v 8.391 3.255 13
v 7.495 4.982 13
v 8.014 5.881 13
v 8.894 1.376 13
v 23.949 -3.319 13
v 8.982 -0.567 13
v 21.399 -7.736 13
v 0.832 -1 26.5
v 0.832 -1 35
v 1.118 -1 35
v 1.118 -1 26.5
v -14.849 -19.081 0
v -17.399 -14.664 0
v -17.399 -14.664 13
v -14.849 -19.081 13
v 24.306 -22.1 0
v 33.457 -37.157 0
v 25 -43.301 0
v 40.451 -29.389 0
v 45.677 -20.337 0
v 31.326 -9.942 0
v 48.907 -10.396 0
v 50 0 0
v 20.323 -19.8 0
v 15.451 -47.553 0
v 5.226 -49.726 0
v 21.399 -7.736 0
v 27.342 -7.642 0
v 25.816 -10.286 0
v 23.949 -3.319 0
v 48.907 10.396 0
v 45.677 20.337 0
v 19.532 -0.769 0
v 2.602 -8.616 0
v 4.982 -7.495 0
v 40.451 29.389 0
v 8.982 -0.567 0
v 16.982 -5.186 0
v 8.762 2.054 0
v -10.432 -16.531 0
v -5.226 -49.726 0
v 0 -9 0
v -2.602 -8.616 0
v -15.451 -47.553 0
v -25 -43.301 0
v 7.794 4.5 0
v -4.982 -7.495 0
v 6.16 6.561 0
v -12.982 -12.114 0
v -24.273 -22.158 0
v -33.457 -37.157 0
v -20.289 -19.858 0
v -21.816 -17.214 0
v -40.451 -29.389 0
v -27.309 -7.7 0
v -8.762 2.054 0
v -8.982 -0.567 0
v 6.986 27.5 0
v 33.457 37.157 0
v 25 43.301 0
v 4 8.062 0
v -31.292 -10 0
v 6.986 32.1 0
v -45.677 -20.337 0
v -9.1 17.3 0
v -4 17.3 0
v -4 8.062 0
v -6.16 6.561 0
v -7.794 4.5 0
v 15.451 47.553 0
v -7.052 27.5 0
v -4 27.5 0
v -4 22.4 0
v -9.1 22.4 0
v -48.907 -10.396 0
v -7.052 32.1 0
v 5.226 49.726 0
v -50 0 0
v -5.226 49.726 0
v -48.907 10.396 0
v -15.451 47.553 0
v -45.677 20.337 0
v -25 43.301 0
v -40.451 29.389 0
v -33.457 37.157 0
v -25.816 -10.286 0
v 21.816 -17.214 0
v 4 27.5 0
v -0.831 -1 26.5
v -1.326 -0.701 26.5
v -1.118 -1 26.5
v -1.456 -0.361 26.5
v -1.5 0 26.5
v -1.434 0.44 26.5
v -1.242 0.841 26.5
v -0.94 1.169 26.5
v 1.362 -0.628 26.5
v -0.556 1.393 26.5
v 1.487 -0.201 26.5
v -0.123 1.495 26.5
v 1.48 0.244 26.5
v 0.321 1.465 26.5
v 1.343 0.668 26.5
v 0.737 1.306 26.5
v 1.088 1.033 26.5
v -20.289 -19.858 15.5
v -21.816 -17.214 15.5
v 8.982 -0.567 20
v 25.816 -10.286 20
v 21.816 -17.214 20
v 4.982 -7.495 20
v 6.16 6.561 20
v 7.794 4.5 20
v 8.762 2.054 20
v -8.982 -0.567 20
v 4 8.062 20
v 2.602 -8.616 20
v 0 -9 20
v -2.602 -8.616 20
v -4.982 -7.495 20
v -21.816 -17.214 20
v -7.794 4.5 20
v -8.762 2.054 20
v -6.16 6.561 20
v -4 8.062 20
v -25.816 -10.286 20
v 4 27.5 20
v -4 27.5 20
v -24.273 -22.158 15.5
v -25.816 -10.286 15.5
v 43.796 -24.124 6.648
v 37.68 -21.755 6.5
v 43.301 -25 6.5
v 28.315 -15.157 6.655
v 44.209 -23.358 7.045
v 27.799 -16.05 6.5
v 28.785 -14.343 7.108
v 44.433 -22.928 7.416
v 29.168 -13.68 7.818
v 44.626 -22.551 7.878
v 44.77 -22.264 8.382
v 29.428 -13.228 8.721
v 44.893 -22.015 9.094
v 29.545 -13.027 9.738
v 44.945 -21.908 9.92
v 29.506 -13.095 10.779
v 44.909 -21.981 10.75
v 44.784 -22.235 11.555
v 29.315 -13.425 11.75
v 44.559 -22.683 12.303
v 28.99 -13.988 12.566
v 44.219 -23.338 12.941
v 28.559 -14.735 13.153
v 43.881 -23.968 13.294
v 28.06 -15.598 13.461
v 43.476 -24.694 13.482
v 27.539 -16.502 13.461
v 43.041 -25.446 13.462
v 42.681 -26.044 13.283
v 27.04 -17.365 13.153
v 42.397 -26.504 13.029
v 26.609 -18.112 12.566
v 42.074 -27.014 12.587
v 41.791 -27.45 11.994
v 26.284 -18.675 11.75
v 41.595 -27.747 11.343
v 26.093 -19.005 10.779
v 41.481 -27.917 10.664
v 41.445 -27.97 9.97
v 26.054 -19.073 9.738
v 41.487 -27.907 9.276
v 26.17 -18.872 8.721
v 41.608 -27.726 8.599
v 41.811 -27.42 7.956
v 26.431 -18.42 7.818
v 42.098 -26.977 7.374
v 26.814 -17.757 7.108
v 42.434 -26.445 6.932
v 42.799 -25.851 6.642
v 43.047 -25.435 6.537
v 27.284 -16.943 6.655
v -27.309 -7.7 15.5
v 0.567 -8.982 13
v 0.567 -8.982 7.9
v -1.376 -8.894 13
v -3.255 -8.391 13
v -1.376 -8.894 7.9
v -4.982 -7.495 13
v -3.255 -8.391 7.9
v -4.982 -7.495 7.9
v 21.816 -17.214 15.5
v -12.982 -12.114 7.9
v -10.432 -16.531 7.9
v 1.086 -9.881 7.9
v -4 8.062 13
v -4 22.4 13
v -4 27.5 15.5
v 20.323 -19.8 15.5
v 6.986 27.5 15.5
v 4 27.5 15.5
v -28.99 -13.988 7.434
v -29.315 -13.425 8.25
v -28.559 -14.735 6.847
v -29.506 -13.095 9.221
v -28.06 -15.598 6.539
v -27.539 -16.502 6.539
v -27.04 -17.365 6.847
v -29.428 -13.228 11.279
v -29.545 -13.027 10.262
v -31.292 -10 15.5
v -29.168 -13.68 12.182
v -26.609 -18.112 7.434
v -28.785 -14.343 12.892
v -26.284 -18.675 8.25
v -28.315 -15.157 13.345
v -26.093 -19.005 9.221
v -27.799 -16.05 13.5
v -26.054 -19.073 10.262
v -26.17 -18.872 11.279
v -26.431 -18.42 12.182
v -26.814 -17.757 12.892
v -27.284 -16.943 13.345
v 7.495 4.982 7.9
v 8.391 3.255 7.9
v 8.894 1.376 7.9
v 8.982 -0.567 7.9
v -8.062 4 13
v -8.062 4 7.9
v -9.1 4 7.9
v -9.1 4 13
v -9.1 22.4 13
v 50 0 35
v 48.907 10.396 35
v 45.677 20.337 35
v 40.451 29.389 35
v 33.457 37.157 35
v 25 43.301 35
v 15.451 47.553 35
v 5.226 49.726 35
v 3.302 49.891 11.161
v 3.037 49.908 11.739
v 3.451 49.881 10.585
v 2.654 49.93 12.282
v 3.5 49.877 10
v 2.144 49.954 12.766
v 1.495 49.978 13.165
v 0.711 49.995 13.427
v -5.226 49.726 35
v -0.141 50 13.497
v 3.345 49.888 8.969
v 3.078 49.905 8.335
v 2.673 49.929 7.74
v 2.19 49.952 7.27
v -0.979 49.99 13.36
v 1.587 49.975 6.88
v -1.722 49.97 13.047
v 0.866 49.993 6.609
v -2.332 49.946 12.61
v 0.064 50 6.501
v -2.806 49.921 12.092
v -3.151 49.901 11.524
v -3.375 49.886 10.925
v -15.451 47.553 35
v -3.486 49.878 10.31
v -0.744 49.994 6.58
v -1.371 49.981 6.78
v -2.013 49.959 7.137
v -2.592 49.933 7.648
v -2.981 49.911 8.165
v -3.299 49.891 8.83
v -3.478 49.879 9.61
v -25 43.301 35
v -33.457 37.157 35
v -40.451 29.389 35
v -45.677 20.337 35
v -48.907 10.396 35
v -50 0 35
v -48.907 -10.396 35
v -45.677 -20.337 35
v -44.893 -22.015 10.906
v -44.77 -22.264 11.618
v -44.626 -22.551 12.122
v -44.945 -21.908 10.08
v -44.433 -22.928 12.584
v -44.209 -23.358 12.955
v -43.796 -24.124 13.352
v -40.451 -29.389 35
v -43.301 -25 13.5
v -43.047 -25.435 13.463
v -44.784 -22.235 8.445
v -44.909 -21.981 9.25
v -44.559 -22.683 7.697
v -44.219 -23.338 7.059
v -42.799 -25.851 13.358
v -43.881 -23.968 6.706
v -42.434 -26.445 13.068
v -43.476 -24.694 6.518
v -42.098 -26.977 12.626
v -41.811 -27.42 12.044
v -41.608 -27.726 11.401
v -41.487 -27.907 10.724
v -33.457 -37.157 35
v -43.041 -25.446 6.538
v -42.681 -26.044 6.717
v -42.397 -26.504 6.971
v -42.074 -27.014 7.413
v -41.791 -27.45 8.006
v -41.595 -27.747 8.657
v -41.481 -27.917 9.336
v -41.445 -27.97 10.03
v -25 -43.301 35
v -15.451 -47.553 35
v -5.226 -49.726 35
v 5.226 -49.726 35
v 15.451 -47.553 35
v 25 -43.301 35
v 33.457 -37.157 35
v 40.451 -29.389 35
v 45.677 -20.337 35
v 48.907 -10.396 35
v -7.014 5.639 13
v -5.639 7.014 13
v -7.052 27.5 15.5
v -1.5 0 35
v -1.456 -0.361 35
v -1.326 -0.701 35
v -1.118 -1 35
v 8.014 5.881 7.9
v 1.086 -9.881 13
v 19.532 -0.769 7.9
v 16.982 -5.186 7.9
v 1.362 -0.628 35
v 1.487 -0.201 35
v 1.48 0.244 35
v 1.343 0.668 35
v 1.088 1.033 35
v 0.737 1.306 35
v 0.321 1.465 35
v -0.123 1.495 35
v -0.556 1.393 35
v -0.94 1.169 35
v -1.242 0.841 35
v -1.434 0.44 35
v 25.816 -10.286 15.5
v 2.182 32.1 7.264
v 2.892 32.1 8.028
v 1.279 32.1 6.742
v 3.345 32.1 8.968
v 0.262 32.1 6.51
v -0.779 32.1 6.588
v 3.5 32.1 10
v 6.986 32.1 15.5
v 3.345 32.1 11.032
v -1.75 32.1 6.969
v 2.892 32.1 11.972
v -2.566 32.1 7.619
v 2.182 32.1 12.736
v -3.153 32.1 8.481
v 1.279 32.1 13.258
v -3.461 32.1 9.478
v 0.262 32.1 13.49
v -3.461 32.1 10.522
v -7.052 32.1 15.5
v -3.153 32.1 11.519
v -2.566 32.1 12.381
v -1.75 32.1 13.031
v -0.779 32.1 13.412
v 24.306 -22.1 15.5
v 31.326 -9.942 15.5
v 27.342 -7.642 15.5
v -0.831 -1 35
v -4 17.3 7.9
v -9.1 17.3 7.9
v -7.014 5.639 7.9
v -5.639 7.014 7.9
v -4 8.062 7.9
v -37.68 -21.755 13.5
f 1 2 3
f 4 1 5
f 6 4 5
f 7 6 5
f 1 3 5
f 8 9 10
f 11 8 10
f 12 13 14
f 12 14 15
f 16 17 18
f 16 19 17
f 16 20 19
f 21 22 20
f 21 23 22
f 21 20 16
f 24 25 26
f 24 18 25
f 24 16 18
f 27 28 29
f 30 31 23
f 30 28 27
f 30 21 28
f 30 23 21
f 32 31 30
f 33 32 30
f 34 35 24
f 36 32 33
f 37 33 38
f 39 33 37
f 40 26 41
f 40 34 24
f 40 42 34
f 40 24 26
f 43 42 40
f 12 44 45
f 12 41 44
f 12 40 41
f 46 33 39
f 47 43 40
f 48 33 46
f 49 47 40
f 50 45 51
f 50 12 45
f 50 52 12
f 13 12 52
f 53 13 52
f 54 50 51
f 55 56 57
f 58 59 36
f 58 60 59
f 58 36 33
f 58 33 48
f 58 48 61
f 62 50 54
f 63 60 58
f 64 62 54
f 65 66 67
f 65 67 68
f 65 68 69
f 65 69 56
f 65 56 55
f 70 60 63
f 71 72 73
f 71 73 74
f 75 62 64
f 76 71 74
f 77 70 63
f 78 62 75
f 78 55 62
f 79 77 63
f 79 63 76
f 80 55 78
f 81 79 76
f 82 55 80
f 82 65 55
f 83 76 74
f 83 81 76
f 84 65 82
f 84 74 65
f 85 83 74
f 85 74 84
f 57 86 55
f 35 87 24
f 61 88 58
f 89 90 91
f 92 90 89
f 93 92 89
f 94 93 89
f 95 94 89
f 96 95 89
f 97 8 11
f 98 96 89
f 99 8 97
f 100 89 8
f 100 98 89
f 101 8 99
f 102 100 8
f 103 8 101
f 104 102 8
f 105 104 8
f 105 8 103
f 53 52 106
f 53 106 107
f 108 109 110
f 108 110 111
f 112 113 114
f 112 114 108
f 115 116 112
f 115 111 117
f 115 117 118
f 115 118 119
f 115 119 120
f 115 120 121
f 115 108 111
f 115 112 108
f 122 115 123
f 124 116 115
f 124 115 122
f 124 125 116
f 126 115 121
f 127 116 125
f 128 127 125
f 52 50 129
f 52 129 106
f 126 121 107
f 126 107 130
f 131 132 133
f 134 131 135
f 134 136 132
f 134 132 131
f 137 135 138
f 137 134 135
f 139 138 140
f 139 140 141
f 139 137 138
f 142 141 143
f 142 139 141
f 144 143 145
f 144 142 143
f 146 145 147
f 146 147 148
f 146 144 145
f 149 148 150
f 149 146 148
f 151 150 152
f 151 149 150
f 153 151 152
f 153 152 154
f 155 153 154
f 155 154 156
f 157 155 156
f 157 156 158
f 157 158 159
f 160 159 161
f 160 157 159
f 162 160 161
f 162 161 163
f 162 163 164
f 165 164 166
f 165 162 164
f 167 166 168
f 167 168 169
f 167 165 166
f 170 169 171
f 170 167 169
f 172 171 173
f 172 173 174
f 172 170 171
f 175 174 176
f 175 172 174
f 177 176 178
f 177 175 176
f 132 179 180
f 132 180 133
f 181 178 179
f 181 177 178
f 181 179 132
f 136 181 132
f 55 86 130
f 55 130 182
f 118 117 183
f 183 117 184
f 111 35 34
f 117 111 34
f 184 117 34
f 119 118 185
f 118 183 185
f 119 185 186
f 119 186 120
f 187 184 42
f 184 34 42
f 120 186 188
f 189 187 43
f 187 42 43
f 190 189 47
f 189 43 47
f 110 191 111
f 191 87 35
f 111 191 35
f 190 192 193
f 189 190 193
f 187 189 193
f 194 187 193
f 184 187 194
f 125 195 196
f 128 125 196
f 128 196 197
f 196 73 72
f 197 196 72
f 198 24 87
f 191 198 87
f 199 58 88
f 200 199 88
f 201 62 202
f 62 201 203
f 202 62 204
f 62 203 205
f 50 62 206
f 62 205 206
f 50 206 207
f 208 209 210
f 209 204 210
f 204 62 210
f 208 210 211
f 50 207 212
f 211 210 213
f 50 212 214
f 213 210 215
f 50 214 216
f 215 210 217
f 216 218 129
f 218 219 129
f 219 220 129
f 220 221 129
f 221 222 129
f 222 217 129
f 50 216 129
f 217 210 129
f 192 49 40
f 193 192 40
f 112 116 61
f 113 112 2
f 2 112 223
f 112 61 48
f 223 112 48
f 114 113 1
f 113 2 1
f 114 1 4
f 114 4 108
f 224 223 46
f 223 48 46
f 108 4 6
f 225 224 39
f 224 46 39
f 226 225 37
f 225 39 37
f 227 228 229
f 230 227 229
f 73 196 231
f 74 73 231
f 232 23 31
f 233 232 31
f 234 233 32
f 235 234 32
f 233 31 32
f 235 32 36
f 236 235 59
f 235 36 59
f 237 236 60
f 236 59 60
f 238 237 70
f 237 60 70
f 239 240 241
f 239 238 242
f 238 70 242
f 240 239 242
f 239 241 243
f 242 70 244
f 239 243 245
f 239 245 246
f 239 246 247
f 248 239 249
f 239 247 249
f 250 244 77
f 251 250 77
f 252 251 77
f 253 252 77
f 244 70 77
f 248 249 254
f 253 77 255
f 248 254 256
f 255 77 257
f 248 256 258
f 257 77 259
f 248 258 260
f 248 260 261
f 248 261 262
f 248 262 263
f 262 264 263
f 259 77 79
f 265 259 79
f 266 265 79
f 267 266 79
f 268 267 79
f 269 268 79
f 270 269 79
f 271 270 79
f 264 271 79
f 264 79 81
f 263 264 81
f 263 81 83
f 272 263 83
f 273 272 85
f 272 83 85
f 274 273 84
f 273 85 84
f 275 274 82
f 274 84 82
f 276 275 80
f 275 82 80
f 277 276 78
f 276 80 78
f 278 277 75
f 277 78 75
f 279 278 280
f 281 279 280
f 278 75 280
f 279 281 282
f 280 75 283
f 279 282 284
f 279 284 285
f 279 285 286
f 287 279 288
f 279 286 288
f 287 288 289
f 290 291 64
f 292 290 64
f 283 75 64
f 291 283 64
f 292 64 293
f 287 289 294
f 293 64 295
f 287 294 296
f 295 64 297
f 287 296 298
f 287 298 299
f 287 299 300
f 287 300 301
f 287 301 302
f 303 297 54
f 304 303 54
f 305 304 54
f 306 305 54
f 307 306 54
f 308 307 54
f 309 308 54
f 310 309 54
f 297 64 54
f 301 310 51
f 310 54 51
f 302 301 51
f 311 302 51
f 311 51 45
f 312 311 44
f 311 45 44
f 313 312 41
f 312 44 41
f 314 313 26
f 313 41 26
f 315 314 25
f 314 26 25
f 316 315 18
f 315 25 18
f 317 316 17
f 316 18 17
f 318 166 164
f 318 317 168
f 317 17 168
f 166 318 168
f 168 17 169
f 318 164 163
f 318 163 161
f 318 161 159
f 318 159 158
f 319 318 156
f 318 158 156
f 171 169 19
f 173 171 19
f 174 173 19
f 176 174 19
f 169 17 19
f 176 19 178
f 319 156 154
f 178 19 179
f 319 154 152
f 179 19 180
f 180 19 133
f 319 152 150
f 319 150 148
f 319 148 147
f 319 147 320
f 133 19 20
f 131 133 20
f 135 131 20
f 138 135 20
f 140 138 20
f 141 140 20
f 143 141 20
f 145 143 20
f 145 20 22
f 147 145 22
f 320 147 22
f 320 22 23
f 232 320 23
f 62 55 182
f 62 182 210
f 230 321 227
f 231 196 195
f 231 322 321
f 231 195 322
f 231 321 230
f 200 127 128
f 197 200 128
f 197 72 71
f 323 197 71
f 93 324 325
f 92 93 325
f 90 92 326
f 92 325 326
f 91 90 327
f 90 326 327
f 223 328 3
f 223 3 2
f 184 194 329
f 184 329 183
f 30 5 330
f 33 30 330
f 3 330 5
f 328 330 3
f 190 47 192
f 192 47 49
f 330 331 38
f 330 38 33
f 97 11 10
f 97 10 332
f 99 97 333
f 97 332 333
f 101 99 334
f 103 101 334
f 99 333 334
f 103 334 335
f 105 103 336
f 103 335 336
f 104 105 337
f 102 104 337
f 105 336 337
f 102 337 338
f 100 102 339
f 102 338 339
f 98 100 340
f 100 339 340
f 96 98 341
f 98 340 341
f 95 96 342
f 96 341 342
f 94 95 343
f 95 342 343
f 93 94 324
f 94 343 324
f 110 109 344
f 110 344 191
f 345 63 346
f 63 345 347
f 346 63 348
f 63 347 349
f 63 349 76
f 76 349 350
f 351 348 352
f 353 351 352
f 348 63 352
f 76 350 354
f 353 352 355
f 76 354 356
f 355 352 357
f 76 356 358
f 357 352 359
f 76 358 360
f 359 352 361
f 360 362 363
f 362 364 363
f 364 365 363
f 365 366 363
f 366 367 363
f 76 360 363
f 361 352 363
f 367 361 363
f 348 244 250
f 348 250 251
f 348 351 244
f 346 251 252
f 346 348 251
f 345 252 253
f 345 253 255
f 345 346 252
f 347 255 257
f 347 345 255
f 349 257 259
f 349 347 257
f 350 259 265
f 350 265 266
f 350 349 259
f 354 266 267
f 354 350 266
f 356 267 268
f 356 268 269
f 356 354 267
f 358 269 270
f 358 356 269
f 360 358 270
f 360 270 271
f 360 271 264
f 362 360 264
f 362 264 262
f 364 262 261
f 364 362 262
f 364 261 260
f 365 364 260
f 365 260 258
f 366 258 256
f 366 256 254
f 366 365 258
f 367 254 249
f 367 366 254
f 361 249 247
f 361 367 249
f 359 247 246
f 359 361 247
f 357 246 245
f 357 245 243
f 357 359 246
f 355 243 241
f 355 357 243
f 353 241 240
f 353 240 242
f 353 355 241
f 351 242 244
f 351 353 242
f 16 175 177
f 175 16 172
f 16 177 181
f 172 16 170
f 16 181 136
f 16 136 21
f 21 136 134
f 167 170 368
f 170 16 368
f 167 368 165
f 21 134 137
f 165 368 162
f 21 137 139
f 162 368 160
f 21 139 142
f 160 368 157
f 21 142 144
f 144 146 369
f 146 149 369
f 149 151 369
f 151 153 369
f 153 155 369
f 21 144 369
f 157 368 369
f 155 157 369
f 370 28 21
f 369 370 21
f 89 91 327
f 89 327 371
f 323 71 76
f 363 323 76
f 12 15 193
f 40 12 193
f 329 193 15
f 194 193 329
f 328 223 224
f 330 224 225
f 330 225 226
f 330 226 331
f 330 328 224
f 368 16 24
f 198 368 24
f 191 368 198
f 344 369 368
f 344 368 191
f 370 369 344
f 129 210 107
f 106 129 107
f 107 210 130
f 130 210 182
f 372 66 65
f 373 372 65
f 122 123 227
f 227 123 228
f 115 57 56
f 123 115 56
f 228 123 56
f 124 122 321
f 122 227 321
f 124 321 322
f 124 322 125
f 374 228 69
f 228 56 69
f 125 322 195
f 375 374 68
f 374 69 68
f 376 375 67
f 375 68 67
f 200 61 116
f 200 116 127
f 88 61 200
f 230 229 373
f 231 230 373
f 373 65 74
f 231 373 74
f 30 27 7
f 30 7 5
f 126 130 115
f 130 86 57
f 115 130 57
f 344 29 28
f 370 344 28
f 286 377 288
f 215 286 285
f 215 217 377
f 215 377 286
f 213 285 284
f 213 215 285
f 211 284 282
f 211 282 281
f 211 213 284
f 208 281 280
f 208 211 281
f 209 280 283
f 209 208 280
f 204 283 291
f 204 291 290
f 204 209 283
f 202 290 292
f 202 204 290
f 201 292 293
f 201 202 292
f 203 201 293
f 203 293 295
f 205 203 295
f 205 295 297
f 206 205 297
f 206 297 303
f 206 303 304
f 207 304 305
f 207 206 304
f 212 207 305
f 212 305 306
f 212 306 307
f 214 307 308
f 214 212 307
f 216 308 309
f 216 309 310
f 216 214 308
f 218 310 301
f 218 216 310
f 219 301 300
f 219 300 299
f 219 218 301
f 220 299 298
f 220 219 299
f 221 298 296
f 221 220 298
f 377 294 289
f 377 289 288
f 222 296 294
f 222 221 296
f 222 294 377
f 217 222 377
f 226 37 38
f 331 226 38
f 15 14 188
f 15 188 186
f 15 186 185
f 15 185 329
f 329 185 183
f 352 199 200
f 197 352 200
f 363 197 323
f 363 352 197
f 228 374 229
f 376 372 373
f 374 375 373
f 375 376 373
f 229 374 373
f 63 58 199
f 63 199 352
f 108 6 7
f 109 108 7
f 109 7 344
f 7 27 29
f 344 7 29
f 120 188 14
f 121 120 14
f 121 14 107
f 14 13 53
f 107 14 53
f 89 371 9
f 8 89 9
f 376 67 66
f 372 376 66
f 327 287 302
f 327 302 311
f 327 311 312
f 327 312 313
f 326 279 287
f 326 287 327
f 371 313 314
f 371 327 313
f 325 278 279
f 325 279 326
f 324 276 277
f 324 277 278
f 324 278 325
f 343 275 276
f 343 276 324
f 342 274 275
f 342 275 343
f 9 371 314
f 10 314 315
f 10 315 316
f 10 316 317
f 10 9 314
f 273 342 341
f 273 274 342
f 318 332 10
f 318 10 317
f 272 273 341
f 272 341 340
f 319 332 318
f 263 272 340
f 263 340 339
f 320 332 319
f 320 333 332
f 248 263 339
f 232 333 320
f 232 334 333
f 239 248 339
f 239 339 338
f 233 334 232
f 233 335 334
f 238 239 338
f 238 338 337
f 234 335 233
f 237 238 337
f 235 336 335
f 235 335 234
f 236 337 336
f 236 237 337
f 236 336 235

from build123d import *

# Parameters (mm, degrees)
SKETCH2_R           = 50
BOSS_EXTRUDE1_DEPTH = 35
SKETCH3_W           = 8
SKETCH3_H           = 35
CUT_EXTRUDE1_DEPTH  = 20
SKETCH4_R           = 3.5
CUT_EXTRUDE2_DEPTH  = 80
SKETCH5_R           = 3.5
CUT_EXTRUDE3_DEPTH  = 50
SKETCH6_R           = 3.5
CUT_EXTRUDE4_DEPTH  = 50
SKETCH8_W           = 14.038446545
SKETCH8_H           = 6.5
CUT_EXTRUDE5_DEPTH  = 15.5
SKETCH11_W          = 8
SKETCH11_H          = 6.5
BOSS_EXTRUDE2_DEPTH = 4.5
BOSS_EXTRUDE3_DEPTH = 15.5
BOSS_EXTRUDE4_DEPTH = 35
SKETCH18_R          = 3.5
CUT_EXTRUDE9_DEPTH  = 25
SKETCH19_R          = 3.5
CUT_EXTRUDE10_DEPTH = 25
SKETCH20_R          = 3.5
CUT_EXTRUDE11_DEPTH = 25
SKETCH21_W          = 5.1
SKETCH21_H          = 18.4
CUT_EXTRUDE12_DEPTH = 13
SKETCH23_W          = 5.1
SKETCH23_H          = 18.4
CUT_EXTRUDE13_DEPTH = 13
SKETCH22_W          = 5.1
SKETCH22_H          = 13.3
BOSS_EXTRUDE5_DEPTH = 7.9
CUT_EXTRUDE14_DEPTH = 8.5
SKETCH25_R          = 9
CUT_EXTRUDE15_DEPTH = 20


with BuildPart() as part:
    # Sketch2 → Boss-Extrude1 (new body)
    with BuildSketch(Plane.XY):
        Circle(SKETCH2_R)
    extrude(amount=BOSS_EXTRUDE1_DEPTH)

    # Sketch3 → Cut-Extrude1 (cut)
    with BuildSketch(Plane(origin=(0, 0, 0), x_dir=(-1, 0, 0), z_dir=(0, 0, -1))):
        with Locations((0, 21.5)):
            Rectangle(SKETCH3_W, SKETCH3_H)
        Polygon((31.774990748, -22.964101615), (35.774990748, -16.035898385), (5.464101615, 1.464101615), (1.464101615, -5.464101615), align=None)
        Polygon((-35.774990748, -16.035898385), (-31.774990748, -22.964101615), (-1.464101615, -5.464101615), (-5.464101615, 1.464101615), align=None)
    extrude(amount=-CUT_EXTRUDE1_DEPTH, mode=Mode.SUBTRACT)

    # Sketch4 → Cut-Extrude2 (cut)
    with BuildSketch(Plane(origin=(-3.464101615, -2, 0), x_dir=(0, 0, 1), z_dir=(-0.866025404, -0.5, 0))):
        with Locations((10, 0)):
            Circle(SKETCH4_R)
    extrude(amount=CUT_EXTRUDE2_DEPTH, mode=Mode.SUBTRACT)

    # Sketch5 → Cut-Extrude3 (cut)
    with BuildSketch(Plane(origin=(0, 4, 0), x_dir=(1, 0, 0), z_dir=(0, 1, 0))):
        with Locations((0, -10)):
            Circle(SKETCH5_R)
    extrude(amount=CUT_EXTRUDE3_DEPTH, mode=Mode.SUBTRACT)

    # Sketch6 → Cut-Extrude4 (cut)
    with BuildSketch(Plane(origin=(3.464101615, -2, 0), x_dir=(0, 0, -1), z_dir=(0.866025404, -0.5, 0))):
        with Locations((-10, 0)):
            Circle(SKETCH6_R)
    extrude(amount=CUT_EXTRUDE4_DEPTH, mode=Mode.SUBTRACT)

    # Sketch8 → Cut-Extrude5 (cut)
    with BuildSketch(Plane(origin=(0, 0, 0), x_dir=(-1, 0, 0), z_dir=(0, 0, -1))):
        Polygon((-32.971083956, -10.892407408), (-25.951860683, -23.050058746), (-20.322695558, -19.800058746), (-27.341918831, -7.642407408), align=None)
        with Locations((0.033217181, 30.75)):
            Rectangle(SKETCH8_W, SKETCH8_H)
        Polygon((27.30870165, -7.699941254), (32.937866774, -10.949941254), (25.918643502, -23.107592592), (20.289478377, -19.857592592), align=None)
    extrude(amount=-CUT_EXTRUDE5_DEPTH, mode=Mode.SUBTRACT)

    # Sketch11 → Boss-Extrude2 (add)
    with BuildSketch(Plane(origin=(0, 0, 20), x_dir=(-1, 0, 0), z_dir=(0, 0, -1))):
        with Locations((0, 30.75)):
            Rectangle(SKETCH11_W, SKETCH11_H)
        Polygon((25.815698604, -10.285898385), (31.444863729, -13.535898385), (27.444863729, -20.464101615), (21.815698604, -17.214101615), align=None)
        Polygon((-21.815698604, -17.214101615), (-27.444863729, -20.464101615), (-31.444863729, -13.535898385), (-25.815698604, -10.285898385), align=None)
    extrude(amount=BOSS_EXTRUDE2_DEPTH)

    # Sketch12 → Boss-Extrude3 (add)
    with BuildSketch(Plane(origin=(0, 0, 15.5), x_dir=(-1, 0, 0), z_dir=(0, 0, -1))):
        Polygon((-6.986006091, 32.1), (7.052440454, 32.1), (7.052440454, 34), (4, 34), (4, 39), (-4, 39), (-4, 34), (-6.986006091, 34), align=None)
        Polygon((25.918643502, -23.107592592), (27.444863729, -20.464101615), (31.774990748, -22.964101615), (35.774990748, -16.035898385), (31.444863729, -13.535898385), (32.937866774, -10.949941254), (31.292418507, -9.999941254), (24.273195235, -22.157592592), align=None)
        Polygon((-32.971083956, -10.892407408), (-31.444863729, -13.535898385), (-35.774990748, -16.035898385), (-31.774990748, -22.964101615), (-27.444863729, -20.464101615), (-25.951860683, -23.050058746), (-24.306412416, -22.100058746), (-31.325635688, -9.942407408), align=None)
    extrude(amount=BOSS_EXTRUDE3_DEPTH)

    # Sketch17 → Boss-Extrude4 (add)
    with BuildSketch(Plane(origin=(0, 0, 0), x_dir=(-1, 0, 0), z_dir=(0, 0, -1))):
        Polygon((-5.842787082, 32.897450406), (-5.842787082, 43.509531182), (5.727819383, 43.509531182), (5.754751517, 32.897450406), align=None)
        Polygon((31.411421312, -11.388723161), (25.612652013, -21.432486209), (34.816449619, -26.715202685), (40.601752851, -16.69476355), align=None)
        Polygon((-25.568634231, -21.508727245), (-31.36740353, -11.464964197), (-40.544269002, -16.794328497), (-34.75896577, -26.814767633), align=None)
    extrude(amount=-BOSS_EXTRUDE4_DEPTH)

    # Sketch18 → Cut-Extrude9 (cut, symmetric)
    with BuildSketch(Plane(origin=(-37.680359311, -21.754765591, 0), x_dir=(0, 0, 1), z_dir=(-0.866025404, -0.5, 0))):
        with Locations((10, 0)):
            Circle(SKETCH18_R)
    extrude(amount=CUT_EXTRUDE9_DEPTH, both=True, mode=Mode.SUBTRACT)

    # Sketch19 → Cut-Extrude10 (cut, symmetric)
    with BuildSketch(Plane(origin=(37.680359311, -21.754765591, 0), x_dir=(0, 0, -1), z_dir=(0.866025404, -0.5, 0))):
        with Locations((-10, 0)):
            Circle(SKETCH19_R)
    extrude(amount=CUT_EXTRUDE10_DEPTH, both=True, mode=Mode.SUBTRACT)

    # Sketch20 → Cut-Extrude11 (cut, symmetric)
    with BuildSketch(Plane(origin=(0, 43.509531182, 0), x_dir=(1, 0, 0), z_dir=(0, 1, 0))):
        with Locations((0, -10)):
            Circle(SKETCH20_R)
    extrude(amount=CUT_EXTRUDE11_DEPTH, both=True, mode=Mode.SUBTRACT)

    # Sketch21 → Cut-Extrude12 (cut)
    with BuildSketch(Plane(origin=(0, 0, 0), x_dir=(-1, 0, 0), z_dir=(0, 0, -1))):
        with Locations((6.55, 13.2)):
            Rectangle(SKETCH21_W, SKETCH21_H)
    extrude(amount=-CUT_EXTRUDE12_DEPTH, mode=Mode.SUBTRACT)

    # Sketch23 → Cut-Extrude13 (cut)
    with BuildSketch(Plane(origin=(0, 0, 0), x_dir=(-1, 0, 0), z_dir=(0, 0, -1))):
        with Locations((6.55, 13.2)):
            Rectangle(SKETCH23_W, SKETCH23_H)
        Polygon((-1.085898385, -9.880831174), (1.464101615, -5.464101615), (17.398969045, -14.664101615), (14.848969045, -19.080831174), align=None)
        Polygon((-8.014101615, 5.880831174), (-5.464101615, 1.464101615), (-21.398969045, -7.735898385), (-23.948969045, -3.319168826), align=None)
    extrude(amount=-CUT_EXTRUDE13_DEPTH, mode=Mode.SUBTRACT)

    # Sketch22 → Boss-Extrude5 (add)
    with BuildSketch(Plane(origin=(0, 0, 0), x_dir=(-1, 0, 0), z_dir=(0, 0, -1))):
        with Locations((6.55, 10.65)):
            Rectangle(SKETCH22_W, SKETCH22_H)
        Polygon((-1.085898385, -9.880831174), (1.464101615, -5.464101615), (12.982239485, -12.114101615), (10.432239485, -16.530831174), align=None)
        Polygon((-8.014101615, 5.880831174), (-5.464101615, 1.464101615), (-16.982239485, -5.185898385), (-19.532239485, -0.769168826), align=None)
    extrude(amount=-BOSS_EXTRUDE5_DEPTH)

    # Sketch24 → Cut-Extrude14 (cut)
    with BuildSketch(Plane.XY.offset(35)):
        with BuildLine():
            Line((0.831568399, -1), (1.11810064, -0.999925477))
            ThreePointArc((1.11810064, -0.999925477), (0.535186435, 1.401276375), (-1.5, 0))
            ThreePointArc((-1.5, 0), (-1.401274891, -0.535190321), (-1.118095094, -0.999931678))
            Line((-1.118095094, -0.999931678), (-0.831313787, -1))
            Line((-0.831313787, -1), (0.831568399, -1))
        make_face()
    extrude(amount=-CUT_EXTRUDE14_DEPTH, mode=Mode.SUBTRACT)

    # Sketch25 → Cut-Extrude15 (cut)
    with BuildSketch(Plane(origin=(0, 0, 0), x_dir=(-1, 0, 0), z_dir=(0, 0, -1))):
        Circle(SKETCH25_R)
    extrude(amount=-CUT_EXTRUDE15_DEPTH, mode=Mode.SUBTRACT)


solid = part.part
